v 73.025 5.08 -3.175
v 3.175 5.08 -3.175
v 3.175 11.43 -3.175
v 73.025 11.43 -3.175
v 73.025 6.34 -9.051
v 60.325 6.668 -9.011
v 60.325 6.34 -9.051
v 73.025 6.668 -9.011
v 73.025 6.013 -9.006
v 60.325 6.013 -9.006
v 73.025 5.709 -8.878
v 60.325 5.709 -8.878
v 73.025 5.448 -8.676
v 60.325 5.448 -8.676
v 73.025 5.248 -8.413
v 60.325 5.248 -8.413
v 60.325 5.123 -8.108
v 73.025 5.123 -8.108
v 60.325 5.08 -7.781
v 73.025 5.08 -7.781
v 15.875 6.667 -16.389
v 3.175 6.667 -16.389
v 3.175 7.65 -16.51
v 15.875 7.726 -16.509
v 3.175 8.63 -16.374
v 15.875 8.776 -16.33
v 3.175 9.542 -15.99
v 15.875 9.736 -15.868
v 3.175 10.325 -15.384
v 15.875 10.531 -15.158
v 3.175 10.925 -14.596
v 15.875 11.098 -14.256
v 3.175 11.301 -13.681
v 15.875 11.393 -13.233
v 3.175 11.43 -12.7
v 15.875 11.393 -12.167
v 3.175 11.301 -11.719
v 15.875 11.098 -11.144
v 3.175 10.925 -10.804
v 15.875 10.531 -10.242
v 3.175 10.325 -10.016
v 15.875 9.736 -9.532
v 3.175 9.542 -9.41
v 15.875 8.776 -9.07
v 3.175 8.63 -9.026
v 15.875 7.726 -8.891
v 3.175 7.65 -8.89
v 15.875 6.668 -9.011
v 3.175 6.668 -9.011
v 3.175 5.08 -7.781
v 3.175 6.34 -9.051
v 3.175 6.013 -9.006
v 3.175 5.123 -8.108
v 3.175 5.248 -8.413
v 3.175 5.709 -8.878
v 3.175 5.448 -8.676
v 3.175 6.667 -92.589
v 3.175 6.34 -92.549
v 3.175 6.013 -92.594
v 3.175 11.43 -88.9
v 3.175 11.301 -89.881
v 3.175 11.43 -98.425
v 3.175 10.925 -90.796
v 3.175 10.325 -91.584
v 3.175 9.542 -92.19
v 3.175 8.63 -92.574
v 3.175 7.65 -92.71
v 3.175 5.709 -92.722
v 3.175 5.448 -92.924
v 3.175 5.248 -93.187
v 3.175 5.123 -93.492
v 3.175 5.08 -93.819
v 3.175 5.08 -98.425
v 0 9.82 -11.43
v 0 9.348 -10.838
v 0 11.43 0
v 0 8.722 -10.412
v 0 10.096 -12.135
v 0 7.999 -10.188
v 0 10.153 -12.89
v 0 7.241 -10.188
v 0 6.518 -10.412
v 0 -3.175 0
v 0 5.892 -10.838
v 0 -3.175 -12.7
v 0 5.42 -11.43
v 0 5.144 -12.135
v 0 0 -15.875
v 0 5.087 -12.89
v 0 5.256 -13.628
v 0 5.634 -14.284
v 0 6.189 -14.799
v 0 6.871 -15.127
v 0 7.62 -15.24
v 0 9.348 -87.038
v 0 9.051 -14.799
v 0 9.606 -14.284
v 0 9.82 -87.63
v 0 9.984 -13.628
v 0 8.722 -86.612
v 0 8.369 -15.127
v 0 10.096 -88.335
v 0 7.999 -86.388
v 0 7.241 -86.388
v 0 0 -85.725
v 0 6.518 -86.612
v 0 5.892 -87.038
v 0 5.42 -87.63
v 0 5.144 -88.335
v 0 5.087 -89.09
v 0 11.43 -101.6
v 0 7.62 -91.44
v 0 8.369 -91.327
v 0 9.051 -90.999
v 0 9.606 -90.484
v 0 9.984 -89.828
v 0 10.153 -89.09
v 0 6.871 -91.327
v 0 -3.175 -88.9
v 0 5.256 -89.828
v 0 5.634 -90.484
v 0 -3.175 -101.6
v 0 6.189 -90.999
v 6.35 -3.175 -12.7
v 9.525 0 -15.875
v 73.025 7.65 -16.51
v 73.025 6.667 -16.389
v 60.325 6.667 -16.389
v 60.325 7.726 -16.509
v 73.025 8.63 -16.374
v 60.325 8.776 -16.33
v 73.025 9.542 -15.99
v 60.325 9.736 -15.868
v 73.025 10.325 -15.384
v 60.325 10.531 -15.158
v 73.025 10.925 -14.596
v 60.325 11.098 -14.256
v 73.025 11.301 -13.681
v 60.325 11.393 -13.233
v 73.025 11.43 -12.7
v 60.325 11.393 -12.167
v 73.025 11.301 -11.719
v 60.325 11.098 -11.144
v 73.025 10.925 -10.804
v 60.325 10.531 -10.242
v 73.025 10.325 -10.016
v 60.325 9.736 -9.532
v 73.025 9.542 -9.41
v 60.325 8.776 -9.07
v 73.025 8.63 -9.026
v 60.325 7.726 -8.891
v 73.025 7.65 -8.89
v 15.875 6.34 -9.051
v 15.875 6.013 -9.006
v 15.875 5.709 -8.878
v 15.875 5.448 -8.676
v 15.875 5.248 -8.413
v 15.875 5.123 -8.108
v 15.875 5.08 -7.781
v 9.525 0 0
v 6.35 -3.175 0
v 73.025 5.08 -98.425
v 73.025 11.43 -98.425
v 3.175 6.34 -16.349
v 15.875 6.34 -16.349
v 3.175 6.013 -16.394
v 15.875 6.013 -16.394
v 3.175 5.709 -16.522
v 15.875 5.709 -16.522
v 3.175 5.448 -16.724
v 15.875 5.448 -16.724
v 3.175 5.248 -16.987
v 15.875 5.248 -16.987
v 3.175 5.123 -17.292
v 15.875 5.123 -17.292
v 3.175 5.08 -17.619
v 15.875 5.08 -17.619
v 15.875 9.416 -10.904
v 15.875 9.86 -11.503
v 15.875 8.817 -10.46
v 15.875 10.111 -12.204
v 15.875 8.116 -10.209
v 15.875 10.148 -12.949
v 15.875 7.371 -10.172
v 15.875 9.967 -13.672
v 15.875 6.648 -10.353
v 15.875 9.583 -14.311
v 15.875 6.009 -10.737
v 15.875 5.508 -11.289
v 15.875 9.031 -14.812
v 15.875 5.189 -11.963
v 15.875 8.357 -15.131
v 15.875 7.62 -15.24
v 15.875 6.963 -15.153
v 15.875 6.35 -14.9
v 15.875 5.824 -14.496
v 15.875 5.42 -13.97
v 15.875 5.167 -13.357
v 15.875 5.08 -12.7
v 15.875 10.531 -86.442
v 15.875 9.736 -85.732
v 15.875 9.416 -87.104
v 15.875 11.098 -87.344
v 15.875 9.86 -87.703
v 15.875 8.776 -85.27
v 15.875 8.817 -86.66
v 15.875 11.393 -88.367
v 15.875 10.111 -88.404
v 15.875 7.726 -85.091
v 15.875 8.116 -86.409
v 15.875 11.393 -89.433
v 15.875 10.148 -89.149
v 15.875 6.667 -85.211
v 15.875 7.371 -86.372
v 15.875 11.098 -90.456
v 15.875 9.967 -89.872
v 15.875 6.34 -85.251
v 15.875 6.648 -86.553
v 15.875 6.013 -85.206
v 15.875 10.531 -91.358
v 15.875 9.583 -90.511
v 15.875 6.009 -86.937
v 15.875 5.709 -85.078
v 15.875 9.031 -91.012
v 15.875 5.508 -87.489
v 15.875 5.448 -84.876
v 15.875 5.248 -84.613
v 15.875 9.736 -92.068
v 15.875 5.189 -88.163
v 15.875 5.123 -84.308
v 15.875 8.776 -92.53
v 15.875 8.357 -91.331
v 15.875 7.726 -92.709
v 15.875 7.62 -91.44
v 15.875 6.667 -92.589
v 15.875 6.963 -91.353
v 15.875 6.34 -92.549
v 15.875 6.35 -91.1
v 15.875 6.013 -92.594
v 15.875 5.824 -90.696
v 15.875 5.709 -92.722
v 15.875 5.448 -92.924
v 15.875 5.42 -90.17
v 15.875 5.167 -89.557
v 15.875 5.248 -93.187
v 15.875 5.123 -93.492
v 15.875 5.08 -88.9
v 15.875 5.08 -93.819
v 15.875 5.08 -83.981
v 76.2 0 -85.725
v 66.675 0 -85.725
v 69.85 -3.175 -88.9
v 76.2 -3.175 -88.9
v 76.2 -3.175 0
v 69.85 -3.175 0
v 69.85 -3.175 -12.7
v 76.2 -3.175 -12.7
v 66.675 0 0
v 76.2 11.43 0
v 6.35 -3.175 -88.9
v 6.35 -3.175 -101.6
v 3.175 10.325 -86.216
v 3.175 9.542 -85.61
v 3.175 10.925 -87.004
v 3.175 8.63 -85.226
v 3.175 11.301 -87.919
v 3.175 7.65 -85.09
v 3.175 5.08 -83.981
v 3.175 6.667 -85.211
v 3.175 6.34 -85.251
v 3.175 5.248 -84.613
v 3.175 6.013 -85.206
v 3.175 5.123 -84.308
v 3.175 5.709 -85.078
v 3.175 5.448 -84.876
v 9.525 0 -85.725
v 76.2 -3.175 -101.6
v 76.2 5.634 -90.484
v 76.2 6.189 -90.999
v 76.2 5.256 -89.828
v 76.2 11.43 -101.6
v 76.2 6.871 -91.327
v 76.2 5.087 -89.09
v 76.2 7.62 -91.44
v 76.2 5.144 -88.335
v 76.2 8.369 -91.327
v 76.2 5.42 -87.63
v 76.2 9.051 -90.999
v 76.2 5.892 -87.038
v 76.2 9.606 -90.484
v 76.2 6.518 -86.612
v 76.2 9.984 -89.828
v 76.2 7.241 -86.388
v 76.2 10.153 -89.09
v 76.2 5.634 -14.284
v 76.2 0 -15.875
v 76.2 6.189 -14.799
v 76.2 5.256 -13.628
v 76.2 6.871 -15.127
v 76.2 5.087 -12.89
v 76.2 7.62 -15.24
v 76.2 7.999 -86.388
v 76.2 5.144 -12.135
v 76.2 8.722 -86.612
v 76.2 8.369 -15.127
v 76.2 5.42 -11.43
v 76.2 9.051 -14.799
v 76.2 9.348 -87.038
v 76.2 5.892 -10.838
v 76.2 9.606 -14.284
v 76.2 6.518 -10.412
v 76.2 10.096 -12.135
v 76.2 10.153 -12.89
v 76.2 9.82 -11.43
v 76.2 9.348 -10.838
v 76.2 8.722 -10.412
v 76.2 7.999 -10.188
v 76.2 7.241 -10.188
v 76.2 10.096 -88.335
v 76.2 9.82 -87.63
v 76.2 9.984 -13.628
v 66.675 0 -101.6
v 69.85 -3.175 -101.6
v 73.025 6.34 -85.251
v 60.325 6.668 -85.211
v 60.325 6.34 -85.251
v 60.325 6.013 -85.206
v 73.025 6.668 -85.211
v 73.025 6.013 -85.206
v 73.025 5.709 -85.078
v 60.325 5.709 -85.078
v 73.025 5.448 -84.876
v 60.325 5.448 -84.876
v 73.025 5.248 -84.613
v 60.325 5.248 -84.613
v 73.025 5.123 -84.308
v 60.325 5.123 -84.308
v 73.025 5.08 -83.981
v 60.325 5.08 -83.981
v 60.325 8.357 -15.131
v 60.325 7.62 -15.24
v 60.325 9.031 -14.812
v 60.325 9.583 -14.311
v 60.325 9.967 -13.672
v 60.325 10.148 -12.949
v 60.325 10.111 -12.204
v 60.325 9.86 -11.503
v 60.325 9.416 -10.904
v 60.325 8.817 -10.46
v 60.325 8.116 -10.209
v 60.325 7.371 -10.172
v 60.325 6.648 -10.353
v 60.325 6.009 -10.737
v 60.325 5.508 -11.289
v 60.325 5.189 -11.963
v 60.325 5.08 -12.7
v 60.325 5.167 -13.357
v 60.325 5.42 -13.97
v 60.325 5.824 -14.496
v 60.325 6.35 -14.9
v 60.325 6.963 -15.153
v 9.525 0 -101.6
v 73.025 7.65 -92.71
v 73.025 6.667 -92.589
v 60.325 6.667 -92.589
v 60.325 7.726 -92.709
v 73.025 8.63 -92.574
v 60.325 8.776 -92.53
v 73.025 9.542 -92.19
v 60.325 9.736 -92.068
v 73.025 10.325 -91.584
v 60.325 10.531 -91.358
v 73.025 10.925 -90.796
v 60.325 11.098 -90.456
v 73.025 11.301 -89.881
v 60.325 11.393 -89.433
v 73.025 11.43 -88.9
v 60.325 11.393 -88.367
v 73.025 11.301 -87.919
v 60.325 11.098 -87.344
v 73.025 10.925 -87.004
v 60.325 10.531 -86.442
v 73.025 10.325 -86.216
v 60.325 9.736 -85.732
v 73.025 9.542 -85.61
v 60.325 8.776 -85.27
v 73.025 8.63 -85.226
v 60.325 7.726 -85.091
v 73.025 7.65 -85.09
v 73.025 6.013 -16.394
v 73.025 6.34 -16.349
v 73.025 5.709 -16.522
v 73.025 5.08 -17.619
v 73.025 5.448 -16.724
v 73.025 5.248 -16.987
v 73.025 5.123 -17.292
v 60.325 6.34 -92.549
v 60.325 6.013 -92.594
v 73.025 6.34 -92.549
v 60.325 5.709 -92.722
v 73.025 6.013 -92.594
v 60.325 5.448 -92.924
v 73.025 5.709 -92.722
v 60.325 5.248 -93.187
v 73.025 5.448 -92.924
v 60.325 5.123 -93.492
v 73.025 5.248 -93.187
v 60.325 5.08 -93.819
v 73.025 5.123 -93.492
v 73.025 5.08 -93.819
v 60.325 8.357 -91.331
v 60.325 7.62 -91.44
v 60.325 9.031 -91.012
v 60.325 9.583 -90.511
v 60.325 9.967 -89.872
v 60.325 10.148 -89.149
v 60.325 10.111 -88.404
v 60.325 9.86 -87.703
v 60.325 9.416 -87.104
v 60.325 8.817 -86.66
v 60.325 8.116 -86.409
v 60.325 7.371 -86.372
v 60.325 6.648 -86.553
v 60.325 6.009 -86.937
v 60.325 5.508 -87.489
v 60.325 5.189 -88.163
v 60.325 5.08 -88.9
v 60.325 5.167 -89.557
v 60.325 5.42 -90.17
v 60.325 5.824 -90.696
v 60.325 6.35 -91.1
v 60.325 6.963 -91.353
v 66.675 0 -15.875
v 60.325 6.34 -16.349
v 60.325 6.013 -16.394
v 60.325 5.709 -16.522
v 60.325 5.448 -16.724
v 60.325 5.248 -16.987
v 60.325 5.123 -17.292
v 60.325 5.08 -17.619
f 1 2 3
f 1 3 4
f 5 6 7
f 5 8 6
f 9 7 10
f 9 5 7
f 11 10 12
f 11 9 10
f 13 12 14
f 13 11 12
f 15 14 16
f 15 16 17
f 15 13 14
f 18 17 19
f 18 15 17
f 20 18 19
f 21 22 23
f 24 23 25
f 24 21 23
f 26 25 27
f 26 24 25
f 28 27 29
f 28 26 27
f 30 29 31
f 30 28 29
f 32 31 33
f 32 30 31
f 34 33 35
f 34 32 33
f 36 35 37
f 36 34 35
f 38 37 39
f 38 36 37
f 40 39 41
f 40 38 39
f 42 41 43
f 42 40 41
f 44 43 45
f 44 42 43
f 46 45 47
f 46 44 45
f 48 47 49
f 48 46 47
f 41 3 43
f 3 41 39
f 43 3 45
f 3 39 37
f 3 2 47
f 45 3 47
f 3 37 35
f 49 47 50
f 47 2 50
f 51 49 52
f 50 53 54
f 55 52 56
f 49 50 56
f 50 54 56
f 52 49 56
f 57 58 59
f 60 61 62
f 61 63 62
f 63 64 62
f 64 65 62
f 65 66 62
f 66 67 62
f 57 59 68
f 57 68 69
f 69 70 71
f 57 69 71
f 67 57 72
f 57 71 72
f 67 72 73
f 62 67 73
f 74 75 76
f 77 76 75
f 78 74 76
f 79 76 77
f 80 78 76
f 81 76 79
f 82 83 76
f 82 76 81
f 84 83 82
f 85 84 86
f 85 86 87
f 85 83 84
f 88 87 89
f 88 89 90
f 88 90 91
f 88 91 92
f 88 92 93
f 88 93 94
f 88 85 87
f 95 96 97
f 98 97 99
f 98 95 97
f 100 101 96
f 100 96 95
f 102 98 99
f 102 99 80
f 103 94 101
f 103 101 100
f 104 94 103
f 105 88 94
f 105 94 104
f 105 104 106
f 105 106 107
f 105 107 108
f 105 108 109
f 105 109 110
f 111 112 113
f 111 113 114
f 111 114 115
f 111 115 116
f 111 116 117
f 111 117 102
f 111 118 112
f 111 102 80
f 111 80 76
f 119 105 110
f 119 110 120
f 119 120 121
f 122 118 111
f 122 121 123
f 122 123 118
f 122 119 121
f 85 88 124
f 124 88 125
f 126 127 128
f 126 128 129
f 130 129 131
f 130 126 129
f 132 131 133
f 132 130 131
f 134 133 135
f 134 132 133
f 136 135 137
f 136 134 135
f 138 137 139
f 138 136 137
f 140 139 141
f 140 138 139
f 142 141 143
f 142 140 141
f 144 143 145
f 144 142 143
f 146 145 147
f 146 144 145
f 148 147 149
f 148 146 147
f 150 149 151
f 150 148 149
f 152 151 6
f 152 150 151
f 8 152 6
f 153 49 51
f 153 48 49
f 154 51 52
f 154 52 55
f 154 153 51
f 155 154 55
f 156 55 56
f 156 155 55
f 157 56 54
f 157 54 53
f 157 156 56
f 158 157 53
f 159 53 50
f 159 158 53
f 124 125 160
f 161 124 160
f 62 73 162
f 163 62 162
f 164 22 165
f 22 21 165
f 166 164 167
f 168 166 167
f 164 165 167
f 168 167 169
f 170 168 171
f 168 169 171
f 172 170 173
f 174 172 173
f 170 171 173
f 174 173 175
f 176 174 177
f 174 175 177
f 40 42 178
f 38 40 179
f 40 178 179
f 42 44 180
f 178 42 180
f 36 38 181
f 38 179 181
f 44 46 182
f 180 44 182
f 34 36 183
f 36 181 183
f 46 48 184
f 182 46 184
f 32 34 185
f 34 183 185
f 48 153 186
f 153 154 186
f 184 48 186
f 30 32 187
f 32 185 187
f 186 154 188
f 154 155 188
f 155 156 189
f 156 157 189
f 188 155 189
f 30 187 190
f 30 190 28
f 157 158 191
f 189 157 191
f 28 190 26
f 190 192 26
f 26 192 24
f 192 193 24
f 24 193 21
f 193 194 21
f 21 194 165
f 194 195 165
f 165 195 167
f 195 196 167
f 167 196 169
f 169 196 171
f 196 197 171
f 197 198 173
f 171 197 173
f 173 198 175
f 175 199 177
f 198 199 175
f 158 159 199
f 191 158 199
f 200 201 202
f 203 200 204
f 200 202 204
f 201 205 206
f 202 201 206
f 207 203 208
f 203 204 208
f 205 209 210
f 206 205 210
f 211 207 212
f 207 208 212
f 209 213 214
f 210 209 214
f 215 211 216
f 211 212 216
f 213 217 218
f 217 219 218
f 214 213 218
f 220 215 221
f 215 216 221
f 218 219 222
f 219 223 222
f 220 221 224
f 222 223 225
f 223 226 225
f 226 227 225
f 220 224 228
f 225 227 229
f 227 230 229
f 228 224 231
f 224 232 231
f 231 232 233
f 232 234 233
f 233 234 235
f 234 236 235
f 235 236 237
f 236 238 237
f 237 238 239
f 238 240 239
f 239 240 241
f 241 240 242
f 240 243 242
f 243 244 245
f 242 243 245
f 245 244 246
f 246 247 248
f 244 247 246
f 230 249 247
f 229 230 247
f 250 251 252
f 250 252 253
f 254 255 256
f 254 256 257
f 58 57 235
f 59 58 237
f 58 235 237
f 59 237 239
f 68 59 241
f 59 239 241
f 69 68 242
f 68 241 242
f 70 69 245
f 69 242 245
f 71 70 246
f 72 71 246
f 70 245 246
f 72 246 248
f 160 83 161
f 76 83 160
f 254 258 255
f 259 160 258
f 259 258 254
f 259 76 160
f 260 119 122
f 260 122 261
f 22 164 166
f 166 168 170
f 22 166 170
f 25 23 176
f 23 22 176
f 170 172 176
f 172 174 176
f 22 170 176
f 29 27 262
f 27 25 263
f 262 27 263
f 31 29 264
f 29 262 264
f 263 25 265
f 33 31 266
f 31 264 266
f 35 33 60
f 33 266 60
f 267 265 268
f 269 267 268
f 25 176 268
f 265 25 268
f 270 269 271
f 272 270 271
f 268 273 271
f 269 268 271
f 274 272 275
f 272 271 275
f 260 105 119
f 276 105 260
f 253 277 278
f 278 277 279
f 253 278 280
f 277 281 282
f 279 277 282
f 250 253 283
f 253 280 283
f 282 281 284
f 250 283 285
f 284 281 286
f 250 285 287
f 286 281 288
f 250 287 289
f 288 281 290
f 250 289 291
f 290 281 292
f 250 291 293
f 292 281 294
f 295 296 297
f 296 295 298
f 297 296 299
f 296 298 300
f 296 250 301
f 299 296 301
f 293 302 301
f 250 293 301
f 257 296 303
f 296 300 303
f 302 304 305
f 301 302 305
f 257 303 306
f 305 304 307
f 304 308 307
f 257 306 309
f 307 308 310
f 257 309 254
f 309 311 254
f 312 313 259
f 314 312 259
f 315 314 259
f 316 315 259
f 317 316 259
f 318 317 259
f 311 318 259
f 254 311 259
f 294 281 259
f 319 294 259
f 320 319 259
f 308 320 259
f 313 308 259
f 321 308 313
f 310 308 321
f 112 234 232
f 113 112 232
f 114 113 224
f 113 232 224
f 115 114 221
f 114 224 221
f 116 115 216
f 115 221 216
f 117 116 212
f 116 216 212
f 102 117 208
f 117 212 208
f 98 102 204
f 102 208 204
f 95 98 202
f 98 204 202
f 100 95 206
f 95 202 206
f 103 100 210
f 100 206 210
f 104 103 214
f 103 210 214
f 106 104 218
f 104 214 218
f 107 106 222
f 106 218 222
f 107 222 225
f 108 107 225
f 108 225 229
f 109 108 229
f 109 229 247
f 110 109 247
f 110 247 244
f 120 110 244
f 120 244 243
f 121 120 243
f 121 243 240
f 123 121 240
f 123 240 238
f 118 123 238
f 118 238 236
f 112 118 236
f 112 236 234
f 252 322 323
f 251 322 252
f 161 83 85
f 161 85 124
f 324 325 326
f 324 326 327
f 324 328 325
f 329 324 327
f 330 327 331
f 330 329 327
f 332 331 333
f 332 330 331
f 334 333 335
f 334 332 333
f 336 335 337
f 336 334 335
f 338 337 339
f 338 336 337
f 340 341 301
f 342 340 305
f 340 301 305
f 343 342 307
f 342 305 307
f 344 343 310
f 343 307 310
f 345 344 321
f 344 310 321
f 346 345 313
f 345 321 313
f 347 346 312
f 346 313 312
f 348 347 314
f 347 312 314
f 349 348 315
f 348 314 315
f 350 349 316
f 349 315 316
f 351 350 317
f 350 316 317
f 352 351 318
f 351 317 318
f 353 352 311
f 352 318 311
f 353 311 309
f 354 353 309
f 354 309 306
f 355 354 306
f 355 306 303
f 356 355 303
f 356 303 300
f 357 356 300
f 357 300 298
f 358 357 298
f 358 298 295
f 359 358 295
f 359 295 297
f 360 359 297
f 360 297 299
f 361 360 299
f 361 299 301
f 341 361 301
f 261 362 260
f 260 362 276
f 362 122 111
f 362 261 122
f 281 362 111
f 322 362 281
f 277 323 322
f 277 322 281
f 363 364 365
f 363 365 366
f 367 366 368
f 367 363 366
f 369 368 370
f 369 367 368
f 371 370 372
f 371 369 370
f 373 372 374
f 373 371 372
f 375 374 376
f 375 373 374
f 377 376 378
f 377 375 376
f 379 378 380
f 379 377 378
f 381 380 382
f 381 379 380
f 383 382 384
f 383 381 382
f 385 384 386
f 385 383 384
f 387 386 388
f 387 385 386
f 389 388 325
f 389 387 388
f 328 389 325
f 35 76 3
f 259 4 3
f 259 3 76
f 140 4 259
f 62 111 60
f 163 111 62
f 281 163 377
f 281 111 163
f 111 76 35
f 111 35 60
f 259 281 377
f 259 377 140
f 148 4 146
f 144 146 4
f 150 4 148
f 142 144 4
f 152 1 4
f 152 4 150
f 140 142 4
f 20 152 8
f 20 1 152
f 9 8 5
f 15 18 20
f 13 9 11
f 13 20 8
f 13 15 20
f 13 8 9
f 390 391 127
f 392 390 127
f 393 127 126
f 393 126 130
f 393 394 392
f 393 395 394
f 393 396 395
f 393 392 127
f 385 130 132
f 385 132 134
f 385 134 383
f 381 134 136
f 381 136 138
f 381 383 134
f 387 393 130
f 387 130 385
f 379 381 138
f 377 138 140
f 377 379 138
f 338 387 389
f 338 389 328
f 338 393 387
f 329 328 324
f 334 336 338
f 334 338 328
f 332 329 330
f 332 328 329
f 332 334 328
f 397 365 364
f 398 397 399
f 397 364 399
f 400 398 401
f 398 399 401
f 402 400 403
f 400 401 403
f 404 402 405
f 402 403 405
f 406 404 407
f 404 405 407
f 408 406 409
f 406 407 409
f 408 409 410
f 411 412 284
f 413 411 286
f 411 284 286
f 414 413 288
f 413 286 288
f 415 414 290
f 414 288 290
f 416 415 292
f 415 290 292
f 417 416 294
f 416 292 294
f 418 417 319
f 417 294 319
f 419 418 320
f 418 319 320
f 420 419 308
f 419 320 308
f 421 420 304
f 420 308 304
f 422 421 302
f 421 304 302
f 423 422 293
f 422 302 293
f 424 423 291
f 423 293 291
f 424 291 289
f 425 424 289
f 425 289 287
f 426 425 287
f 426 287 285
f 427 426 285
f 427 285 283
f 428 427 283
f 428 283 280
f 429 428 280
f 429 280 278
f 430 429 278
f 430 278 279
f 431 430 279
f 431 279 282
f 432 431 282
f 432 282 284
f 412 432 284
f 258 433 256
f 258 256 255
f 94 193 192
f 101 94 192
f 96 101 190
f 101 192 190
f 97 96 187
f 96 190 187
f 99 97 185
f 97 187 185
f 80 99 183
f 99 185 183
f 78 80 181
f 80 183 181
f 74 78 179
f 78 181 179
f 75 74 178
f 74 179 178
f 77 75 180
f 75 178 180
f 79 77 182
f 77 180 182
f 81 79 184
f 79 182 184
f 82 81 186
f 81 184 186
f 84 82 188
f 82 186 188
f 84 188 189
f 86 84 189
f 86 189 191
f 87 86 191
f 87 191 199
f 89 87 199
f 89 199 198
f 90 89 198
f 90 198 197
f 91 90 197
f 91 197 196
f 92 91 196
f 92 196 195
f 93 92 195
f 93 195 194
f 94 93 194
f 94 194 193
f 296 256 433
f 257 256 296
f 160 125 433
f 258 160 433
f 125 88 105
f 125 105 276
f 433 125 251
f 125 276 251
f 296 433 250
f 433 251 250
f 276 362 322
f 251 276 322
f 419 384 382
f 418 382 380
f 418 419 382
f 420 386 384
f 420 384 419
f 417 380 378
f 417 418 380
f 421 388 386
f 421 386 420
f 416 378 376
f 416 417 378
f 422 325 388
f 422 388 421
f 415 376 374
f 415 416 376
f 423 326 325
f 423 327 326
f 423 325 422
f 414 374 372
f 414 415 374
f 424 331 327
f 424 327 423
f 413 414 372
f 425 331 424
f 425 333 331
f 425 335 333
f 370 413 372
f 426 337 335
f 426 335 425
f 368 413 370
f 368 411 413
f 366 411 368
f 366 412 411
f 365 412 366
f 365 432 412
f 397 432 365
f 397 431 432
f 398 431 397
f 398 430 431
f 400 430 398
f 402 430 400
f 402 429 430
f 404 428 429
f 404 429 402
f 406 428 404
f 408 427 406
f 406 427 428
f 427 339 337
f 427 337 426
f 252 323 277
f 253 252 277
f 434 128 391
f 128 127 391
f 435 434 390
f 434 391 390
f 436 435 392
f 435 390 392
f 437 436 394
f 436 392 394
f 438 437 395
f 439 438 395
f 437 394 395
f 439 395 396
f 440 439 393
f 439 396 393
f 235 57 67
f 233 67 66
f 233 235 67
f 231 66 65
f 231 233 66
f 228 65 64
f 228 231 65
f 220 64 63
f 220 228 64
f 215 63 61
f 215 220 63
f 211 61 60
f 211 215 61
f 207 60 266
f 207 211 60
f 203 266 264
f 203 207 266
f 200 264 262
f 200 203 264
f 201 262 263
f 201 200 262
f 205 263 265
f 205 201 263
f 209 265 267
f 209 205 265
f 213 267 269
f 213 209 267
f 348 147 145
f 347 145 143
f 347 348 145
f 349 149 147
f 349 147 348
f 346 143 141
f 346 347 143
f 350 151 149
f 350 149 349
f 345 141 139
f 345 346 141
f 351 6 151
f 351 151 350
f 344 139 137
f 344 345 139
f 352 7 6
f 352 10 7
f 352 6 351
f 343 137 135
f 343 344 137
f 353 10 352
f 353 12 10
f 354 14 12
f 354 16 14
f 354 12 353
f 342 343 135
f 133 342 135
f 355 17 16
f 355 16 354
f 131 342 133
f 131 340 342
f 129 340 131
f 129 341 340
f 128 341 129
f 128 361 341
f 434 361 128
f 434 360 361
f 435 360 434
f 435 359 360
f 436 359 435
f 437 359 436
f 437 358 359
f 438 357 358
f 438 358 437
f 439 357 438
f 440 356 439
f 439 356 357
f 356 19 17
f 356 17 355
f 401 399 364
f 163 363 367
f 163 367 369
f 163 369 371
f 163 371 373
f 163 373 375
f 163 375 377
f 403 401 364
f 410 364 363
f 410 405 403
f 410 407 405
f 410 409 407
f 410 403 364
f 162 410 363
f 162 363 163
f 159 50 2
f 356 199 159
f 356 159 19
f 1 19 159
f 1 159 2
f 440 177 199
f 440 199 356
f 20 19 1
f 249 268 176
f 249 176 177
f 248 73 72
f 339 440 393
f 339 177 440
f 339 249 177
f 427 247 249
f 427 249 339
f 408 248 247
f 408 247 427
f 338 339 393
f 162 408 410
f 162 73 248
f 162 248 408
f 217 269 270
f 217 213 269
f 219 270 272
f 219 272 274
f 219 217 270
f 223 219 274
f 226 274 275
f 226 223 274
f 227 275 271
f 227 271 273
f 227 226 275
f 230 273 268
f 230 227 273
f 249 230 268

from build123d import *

# Parameters (mm, degrees)
SKETCH1_W           = 76.2
SKETCH1_H           = 101.6
BOSS_EXTRUDE1_DEPTH = 5.08
SKETCH4_W           = 76.2
SKETCH4_H           = 101.6
SKETCH4_W_2         = 69.85
SKETCH4_H_2         = 95.25
BOSS_EXTRUDE3_DEPTH = 6.35
SKETCH5_R           = 3.81
SKETCH5_R_2         = 2.54
BOSS_EXTRUDE4_DEPTH = 73.025
SKETCH6_R           = 2.54
CUT_EXTRUDE2_DEPTH  = 128.513312638
SKETCH7_W           = 44.45
SKETCH7_H           = 95.25
CUT_EXTRUDE3_DEPTH  = 128.158650905
FILLET1_R           = 1.27
SKETCH8_W           = 6.35
SKETCH8_H           = 12.7
BOSS_EXTRUDE5_DEPTH = 3.175
CHAMFER1_SIZE       = 3.175


with BuildPart() as part:
    # Sketch1 → Boss-Extrude1 (new body)
    with BuildSketch(Plane(origin=(0, 0, 0), x_dir=(1, 0, 0), z_dir=(0, 1, 0))):
        with Locations((38.1, 50.8)):
            Rectangle(SKETCH1_W, SKETCH1_H)
    extrude(amount=BOSS_EXTRUDE1_DEPTH)

    # Sketch4 → Boss-Extrude3 (add)
    with BuildSketch(Plane(origin=(0, 5.08, 0), x_dir=(1, 0, 0), z_dir=(0, 1, 0))):
        with Locations((38.1, 50.8)):
            Rectangle(SKETCH4_W, SKETCH4_H)
        with Locations((38.1, 50.8)):
            Rectangle(SKETCH4_W_2, SKETCH4_H_2, mode=Mode.SUBTRACT)
    extrude(amount=BOSS_EXTRUDE3_DEPTH)

    # Sketch5 → Boss-Extrude4 (add)
    # profile 1 of 2: a face of its own
    with BuildSketch(Plane(origin=(76.2, 0, 0), x_dir=(0, 0, -1), z_dir=(1, 0, 0))):
        with Locations((12.7, 7.62)):
            Circle(SKETCH5_R)
        with Locations((12.7, 7.62)):
            Circle(SKETCH5_R_2, mode=Mode.SUBTRACT)
    # profile 2 of 2: a face of its own
    with BuildSketch(Plane(origin=(76.2, 0, 0), x_dir=(0, 0, -1), z_dir=(1, 0, 0))):
        with Locations((88.9, 7.62)):
            Circle(SKETCH5_R)
        with Locations((88.9, 7.62)):
            Circle(SKETCH5_R_2, mode=Mode.SUBTRACT)
    extrude(amount=-BOSS_EXTRUDE4_DEPTH)

    # Sketch6 → Cut-Extrude2 (cut, through all)
    with BuildSketch(Plane(origin=(76.2, 0, 0), x_dir=(0, 0, -1), z_dir=(1, 0, 0))):
        with Locations((12.7, 7.62)):
            Circle(SKETCH6_R)
        with Locations((88.9, 7.62)):
            Circle(SKETCH6_R)
    extrude(amount=-CUT_EXTRUDE2_DEPTH, mode=Mode.SUBTRACT)

    # Sketch7 → Cut-Extrude3 (cut, through all)
    with BuildSketch(Plane(origin=(0, 5.08, 0), x_dir=(1, 0, 0), z_dir=(0, 1, 0))):
        with Locations((38.1, 50.8)):
            Rectangle(SKETCH7_W, SKETCH7_H)
    extrude(amount=CUT_EXTRUDE3_DEPTH, mode=Mode.SUBTRACT)

    # Fillet1
    fillet1_edges = [part.edges().sort_by_distance(p)[0] for p in [
        (66.675, 5.08, -91.739806331),
        (9.525, 5.08, -86.060193669),
        (66.675, 5.08, -15.539806331),
        (9.525, 5.08, -9.860193669),
        (66.675, 5.08, -9.860193669),
        (9.525, 5.08, -15.539806331),
        (66.675, 5.08, -86.060193669),
        (9.525, 5.08, -91.739806331),
    ]]
    fillet(fillet1_edges, radius=FILLET1_R)

    # Sketch8 → Boss-Extrude5 (add)
    with BuildSketch(Plane.XZ):
        with Locations((73.025, -6.35)):
            Rectangle(SKETCH8_W, SKETCH8_H)
        with Locations((73.025, -95.25)):
            Rectangle(SKETCH8_W, SKETCH8_H)
        with Locations((3.175, -95.25)):
            Rectangle(SKETCH8_W, SKETCH8_H)
        with Locations((3.175, -6.35)):
            Rectangle(SKETCH8_W, SKETCH8_H)
    extrude(amount=BOSS_EXTRUDE5_DEPTH)

    # Chamfer1
    chamfer1_edges = [part.edges().sort_by_distance(p)[0] for p in [
        (69.85, 0, -95.25),
        (73.025, 0, -88.9),
        (69.85, 0, -6.35),
        (73.025, 0, -12.7),
        (3.175, 0, -12.7),
        (6.35, 0, -6.35),
        (3.175, 0, -88.9),
        (6.35, 0, -95.25),
    ]]
    chamfer(chamfer1_edges, length=CHAMFER1_SIZE - 0.0001)  # a hair under: the kernel refuses the full size


solid = part.part
